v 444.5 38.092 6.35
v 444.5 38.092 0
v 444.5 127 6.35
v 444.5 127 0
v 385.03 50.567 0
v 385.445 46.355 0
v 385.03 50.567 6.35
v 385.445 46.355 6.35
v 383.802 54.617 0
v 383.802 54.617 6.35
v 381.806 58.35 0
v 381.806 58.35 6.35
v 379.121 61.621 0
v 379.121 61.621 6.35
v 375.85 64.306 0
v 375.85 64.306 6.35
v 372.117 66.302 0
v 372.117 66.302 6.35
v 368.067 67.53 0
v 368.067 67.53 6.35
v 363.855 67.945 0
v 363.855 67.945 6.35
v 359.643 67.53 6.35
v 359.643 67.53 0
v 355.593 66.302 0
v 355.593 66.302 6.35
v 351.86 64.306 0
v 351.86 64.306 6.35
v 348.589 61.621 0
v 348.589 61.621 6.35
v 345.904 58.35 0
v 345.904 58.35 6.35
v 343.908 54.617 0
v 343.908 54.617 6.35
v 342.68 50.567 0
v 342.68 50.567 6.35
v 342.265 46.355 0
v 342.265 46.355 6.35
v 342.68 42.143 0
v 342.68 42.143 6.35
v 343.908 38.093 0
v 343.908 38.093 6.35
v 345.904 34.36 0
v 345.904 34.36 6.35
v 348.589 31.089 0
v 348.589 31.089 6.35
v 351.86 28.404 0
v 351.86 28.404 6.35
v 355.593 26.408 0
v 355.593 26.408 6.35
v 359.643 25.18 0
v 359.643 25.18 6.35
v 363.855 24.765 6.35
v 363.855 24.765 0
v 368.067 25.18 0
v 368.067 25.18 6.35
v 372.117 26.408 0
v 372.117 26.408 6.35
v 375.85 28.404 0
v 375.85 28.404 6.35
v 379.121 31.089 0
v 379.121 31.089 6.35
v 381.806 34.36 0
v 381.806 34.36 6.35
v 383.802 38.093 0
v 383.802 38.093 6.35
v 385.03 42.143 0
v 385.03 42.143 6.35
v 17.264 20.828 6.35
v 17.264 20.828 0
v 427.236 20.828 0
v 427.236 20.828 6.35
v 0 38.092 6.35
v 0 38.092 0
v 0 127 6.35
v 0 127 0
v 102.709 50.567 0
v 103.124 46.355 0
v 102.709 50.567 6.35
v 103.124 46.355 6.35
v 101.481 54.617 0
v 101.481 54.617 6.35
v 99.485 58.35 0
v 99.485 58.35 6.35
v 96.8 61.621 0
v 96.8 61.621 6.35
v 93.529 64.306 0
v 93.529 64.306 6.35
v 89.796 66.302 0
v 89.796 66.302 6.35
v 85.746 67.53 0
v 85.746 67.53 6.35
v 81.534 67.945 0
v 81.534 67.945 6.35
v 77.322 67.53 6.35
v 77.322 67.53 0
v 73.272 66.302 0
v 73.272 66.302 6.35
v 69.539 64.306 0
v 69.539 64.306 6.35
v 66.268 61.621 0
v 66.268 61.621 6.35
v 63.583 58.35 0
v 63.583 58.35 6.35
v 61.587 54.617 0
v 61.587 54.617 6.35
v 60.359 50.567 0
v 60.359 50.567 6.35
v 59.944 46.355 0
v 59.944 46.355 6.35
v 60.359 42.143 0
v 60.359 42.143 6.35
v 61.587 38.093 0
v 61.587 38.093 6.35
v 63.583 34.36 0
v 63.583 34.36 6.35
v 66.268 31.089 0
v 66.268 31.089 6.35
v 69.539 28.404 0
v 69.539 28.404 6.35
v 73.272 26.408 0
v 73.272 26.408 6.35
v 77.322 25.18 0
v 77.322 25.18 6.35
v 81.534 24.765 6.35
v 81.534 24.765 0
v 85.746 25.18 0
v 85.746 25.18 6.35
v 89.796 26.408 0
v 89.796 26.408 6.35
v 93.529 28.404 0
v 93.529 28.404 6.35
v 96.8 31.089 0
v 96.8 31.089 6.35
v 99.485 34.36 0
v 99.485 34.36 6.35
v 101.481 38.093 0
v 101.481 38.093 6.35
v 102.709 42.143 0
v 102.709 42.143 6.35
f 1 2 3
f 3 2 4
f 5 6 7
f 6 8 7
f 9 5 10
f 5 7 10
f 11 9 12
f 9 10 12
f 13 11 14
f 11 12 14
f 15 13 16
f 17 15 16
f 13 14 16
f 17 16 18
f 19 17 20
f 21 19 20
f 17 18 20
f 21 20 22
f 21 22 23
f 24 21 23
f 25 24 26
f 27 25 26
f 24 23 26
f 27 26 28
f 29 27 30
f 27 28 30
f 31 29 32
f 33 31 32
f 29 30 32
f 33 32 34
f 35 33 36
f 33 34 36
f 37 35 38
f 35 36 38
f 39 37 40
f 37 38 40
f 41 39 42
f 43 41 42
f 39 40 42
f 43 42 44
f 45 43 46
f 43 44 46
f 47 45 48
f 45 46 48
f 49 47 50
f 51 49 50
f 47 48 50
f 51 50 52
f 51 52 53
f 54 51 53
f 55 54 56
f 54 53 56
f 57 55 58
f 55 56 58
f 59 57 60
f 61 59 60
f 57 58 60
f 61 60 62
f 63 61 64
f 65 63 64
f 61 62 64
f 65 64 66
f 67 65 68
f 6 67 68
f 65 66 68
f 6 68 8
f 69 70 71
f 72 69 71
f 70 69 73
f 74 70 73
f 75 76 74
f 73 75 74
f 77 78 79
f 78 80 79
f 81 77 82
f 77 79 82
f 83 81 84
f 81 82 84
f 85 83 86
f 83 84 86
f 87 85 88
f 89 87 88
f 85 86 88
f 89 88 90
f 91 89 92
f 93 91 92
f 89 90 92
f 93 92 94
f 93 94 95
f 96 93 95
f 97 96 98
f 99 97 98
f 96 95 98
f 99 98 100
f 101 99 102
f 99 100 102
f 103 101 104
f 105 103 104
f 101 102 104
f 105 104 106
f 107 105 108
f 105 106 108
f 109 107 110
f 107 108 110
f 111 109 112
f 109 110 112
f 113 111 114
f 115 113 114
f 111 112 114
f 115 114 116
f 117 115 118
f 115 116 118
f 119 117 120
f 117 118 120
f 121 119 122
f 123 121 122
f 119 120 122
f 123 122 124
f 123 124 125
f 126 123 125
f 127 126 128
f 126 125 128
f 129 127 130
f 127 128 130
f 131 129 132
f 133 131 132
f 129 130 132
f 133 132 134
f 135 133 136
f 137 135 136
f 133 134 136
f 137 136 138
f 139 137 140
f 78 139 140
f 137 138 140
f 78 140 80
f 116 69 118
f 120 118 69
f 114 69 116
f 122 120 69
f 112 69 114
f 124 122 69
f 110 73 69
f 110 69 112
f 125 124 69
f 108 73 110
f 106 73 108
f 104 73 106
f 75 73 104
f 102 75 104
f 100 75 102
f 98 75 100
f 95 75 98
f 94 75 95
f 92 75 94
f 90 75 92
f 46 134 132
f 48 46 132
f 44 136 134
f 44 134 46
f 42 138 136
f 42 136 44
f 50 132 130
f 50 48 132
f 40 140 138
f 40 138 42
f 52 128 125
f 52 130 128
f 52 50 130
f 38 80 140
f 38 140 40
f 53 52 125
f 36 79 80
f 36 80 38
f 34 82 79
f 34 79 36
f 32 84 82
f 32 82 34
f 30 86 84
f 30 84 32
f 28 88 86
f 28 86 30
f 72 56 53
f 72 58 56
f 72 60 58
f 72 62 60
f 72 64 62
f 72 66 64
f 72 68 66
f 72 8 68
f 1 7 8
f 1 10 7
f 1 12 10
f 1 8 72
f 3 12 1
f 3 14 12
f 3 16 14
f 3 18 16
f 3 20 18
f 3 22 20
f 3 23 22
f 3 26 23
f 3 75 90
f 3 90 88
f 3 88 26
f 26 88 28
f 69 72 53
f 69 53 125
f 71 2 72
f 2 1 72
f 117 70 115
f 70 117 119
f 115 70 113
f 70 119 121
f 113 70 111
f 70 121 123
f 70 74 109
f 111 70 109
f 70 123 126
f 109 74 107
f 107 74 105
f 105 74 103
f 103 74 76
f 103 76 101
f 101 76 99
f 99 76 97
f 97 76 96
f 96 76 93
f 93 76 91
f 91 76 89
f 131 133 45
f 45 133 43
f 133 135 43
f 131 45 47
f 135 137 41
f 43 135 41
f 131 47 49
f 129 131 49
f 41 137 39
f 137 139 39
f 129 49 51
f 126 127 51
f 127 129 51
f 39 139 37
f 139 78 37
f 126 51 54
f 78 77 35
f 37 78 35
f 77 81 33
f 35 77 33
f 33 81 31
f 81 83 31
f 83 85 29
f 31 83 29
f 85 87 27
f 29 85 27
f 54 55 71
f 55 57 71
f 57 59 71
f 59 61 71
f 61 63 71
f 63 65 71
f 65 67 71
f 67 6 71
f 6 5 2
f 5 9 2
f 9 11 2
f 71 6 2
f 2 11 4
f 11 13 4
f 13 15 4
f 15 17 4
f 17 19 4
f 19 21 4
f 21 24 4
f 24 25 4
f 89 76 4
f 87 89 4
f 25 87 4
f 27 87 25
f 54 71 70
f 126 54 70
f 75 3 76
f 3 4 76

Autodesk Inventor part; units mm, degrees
ref_plane "YZ Plane" through (0, 0, 0) normal (1, 0, 0) x (0, 1, 0)
ref_plane "XZ Plane" through (0, 0, 0) normal (0, 1, 0) x (-1, 0, 0)
ref_plane "XY Plane" through (0, 0, 0) normal (0, 0, 1) x (1, 0, 0)
sketch "Sketch1" plane through (0, 0, 0) normal (0, 0, 1) x (1, 0, 0)
  line L0 (0, 0) -> (444.5, 0)
  line L1 (444.5, 0) -> (444.5, 127)
  line L2 (444.5, 127) -> (0, 127)
  line L3 (0, 127) -> (0, 0)
  dimension "d0" = 444.5
  dimension "d1" = 127
extrude "Extrusion1" add sketch "Sketch1" along normal blind 6.35
sketch "Sketch2" plane through (0, 0, 6.35) normal (0, 0, 1) x (1, 0, 0)
  line L0 (0, 0) -> (444.5, 0) projected
  line L1 (38.0923, 0) -> (0, 38.0919)
  line L2 (0, 127) -> (0, 0) projected
  line L3 (0, 0) -> (444.5, 0) projected
  line L4 (444.5, 0) -> (444.5, 127) projected
  line L5 (444.5, 0) -> (406.4, 0)
  line L6 (444.5, 0) -> (482.6, 0) construction
  line L7 (444.5, 0) -> (444.5, 38.0919)
  line L8 (444.5, 38.0919) -> (406.4086, 0)
  point P0 (419.1126, 0)
  dimension "d19" = 38.1
  dimension "d20" = 180
extrude "Extrusion2" cut sketch "Sketch2" against normal blind 50.8
sketch "Sketch3" plane through (0, 0, 6.35) normal (0, 0, 1) x (1, 0, 0)
  line L0 (0, 77.664) -> (80.645, 77.664) construction
  line L1 (444.5, 127) -> (0, 127) projected
  line L2 (80.645, 127) -> (161.29, 127) construction
  circle A0 centre (81.534, 46.355) radius 21.59
  line L3 (444.5, 38.0919) -> (444.5, 127) projected
  line L4 (444.5, 77.664) -> (525.145, 77.664) construction
  line L5 (444.5, 38.0919) -> (444.5, 127) projected
  line L6 (444.5, 46.355) -> (525.145, 46.355) construction
  circle A1 centre (363.855, 46.355) radius 21.59
  line L7 (444.5, 127) -> (0, 127) projected
  line L8 (0, 127) -> (0, 38.0919) projected
  circle A2 centre (58.2577, 38.8774) radius 1.8542
  circle A3 centre (58.3621, 41.6798) radius 1.8288
  circle A4 centre (104.5311, 39.3446) radius 1.8542
  circle A5 centre (104.7028, 53.3654) radius 1.8542
  point P0 (0, 0)
  dimension "d10" = 43.18
  dimension "d18" = 43.18
  dimension "d40" = 46.228
  dimension "d41" = 3.7084
  dimension "d42" = 3.6576
  dimension "d43" = 3.7084
  dimension "d44" = 3.7084
  dimension "d45" = 80.645
  dimension "d46" = 80.645
  dimension "d47" = 73.6346
  dimension "d48" = 14.0208
  dimension "d49" = 2.8024
extrude "Extrusion3" cut sketch "Sketch3" against normal blind 50.8 contours A0 | A1
thicken "Thicken1" operation add thickness 20.828 both sides no extend neighbours yes toward (0, 1, 0) faces at (160.8644, 0, 2.1167)
properties part number "MecanumDriveTrainPlate17-18"
